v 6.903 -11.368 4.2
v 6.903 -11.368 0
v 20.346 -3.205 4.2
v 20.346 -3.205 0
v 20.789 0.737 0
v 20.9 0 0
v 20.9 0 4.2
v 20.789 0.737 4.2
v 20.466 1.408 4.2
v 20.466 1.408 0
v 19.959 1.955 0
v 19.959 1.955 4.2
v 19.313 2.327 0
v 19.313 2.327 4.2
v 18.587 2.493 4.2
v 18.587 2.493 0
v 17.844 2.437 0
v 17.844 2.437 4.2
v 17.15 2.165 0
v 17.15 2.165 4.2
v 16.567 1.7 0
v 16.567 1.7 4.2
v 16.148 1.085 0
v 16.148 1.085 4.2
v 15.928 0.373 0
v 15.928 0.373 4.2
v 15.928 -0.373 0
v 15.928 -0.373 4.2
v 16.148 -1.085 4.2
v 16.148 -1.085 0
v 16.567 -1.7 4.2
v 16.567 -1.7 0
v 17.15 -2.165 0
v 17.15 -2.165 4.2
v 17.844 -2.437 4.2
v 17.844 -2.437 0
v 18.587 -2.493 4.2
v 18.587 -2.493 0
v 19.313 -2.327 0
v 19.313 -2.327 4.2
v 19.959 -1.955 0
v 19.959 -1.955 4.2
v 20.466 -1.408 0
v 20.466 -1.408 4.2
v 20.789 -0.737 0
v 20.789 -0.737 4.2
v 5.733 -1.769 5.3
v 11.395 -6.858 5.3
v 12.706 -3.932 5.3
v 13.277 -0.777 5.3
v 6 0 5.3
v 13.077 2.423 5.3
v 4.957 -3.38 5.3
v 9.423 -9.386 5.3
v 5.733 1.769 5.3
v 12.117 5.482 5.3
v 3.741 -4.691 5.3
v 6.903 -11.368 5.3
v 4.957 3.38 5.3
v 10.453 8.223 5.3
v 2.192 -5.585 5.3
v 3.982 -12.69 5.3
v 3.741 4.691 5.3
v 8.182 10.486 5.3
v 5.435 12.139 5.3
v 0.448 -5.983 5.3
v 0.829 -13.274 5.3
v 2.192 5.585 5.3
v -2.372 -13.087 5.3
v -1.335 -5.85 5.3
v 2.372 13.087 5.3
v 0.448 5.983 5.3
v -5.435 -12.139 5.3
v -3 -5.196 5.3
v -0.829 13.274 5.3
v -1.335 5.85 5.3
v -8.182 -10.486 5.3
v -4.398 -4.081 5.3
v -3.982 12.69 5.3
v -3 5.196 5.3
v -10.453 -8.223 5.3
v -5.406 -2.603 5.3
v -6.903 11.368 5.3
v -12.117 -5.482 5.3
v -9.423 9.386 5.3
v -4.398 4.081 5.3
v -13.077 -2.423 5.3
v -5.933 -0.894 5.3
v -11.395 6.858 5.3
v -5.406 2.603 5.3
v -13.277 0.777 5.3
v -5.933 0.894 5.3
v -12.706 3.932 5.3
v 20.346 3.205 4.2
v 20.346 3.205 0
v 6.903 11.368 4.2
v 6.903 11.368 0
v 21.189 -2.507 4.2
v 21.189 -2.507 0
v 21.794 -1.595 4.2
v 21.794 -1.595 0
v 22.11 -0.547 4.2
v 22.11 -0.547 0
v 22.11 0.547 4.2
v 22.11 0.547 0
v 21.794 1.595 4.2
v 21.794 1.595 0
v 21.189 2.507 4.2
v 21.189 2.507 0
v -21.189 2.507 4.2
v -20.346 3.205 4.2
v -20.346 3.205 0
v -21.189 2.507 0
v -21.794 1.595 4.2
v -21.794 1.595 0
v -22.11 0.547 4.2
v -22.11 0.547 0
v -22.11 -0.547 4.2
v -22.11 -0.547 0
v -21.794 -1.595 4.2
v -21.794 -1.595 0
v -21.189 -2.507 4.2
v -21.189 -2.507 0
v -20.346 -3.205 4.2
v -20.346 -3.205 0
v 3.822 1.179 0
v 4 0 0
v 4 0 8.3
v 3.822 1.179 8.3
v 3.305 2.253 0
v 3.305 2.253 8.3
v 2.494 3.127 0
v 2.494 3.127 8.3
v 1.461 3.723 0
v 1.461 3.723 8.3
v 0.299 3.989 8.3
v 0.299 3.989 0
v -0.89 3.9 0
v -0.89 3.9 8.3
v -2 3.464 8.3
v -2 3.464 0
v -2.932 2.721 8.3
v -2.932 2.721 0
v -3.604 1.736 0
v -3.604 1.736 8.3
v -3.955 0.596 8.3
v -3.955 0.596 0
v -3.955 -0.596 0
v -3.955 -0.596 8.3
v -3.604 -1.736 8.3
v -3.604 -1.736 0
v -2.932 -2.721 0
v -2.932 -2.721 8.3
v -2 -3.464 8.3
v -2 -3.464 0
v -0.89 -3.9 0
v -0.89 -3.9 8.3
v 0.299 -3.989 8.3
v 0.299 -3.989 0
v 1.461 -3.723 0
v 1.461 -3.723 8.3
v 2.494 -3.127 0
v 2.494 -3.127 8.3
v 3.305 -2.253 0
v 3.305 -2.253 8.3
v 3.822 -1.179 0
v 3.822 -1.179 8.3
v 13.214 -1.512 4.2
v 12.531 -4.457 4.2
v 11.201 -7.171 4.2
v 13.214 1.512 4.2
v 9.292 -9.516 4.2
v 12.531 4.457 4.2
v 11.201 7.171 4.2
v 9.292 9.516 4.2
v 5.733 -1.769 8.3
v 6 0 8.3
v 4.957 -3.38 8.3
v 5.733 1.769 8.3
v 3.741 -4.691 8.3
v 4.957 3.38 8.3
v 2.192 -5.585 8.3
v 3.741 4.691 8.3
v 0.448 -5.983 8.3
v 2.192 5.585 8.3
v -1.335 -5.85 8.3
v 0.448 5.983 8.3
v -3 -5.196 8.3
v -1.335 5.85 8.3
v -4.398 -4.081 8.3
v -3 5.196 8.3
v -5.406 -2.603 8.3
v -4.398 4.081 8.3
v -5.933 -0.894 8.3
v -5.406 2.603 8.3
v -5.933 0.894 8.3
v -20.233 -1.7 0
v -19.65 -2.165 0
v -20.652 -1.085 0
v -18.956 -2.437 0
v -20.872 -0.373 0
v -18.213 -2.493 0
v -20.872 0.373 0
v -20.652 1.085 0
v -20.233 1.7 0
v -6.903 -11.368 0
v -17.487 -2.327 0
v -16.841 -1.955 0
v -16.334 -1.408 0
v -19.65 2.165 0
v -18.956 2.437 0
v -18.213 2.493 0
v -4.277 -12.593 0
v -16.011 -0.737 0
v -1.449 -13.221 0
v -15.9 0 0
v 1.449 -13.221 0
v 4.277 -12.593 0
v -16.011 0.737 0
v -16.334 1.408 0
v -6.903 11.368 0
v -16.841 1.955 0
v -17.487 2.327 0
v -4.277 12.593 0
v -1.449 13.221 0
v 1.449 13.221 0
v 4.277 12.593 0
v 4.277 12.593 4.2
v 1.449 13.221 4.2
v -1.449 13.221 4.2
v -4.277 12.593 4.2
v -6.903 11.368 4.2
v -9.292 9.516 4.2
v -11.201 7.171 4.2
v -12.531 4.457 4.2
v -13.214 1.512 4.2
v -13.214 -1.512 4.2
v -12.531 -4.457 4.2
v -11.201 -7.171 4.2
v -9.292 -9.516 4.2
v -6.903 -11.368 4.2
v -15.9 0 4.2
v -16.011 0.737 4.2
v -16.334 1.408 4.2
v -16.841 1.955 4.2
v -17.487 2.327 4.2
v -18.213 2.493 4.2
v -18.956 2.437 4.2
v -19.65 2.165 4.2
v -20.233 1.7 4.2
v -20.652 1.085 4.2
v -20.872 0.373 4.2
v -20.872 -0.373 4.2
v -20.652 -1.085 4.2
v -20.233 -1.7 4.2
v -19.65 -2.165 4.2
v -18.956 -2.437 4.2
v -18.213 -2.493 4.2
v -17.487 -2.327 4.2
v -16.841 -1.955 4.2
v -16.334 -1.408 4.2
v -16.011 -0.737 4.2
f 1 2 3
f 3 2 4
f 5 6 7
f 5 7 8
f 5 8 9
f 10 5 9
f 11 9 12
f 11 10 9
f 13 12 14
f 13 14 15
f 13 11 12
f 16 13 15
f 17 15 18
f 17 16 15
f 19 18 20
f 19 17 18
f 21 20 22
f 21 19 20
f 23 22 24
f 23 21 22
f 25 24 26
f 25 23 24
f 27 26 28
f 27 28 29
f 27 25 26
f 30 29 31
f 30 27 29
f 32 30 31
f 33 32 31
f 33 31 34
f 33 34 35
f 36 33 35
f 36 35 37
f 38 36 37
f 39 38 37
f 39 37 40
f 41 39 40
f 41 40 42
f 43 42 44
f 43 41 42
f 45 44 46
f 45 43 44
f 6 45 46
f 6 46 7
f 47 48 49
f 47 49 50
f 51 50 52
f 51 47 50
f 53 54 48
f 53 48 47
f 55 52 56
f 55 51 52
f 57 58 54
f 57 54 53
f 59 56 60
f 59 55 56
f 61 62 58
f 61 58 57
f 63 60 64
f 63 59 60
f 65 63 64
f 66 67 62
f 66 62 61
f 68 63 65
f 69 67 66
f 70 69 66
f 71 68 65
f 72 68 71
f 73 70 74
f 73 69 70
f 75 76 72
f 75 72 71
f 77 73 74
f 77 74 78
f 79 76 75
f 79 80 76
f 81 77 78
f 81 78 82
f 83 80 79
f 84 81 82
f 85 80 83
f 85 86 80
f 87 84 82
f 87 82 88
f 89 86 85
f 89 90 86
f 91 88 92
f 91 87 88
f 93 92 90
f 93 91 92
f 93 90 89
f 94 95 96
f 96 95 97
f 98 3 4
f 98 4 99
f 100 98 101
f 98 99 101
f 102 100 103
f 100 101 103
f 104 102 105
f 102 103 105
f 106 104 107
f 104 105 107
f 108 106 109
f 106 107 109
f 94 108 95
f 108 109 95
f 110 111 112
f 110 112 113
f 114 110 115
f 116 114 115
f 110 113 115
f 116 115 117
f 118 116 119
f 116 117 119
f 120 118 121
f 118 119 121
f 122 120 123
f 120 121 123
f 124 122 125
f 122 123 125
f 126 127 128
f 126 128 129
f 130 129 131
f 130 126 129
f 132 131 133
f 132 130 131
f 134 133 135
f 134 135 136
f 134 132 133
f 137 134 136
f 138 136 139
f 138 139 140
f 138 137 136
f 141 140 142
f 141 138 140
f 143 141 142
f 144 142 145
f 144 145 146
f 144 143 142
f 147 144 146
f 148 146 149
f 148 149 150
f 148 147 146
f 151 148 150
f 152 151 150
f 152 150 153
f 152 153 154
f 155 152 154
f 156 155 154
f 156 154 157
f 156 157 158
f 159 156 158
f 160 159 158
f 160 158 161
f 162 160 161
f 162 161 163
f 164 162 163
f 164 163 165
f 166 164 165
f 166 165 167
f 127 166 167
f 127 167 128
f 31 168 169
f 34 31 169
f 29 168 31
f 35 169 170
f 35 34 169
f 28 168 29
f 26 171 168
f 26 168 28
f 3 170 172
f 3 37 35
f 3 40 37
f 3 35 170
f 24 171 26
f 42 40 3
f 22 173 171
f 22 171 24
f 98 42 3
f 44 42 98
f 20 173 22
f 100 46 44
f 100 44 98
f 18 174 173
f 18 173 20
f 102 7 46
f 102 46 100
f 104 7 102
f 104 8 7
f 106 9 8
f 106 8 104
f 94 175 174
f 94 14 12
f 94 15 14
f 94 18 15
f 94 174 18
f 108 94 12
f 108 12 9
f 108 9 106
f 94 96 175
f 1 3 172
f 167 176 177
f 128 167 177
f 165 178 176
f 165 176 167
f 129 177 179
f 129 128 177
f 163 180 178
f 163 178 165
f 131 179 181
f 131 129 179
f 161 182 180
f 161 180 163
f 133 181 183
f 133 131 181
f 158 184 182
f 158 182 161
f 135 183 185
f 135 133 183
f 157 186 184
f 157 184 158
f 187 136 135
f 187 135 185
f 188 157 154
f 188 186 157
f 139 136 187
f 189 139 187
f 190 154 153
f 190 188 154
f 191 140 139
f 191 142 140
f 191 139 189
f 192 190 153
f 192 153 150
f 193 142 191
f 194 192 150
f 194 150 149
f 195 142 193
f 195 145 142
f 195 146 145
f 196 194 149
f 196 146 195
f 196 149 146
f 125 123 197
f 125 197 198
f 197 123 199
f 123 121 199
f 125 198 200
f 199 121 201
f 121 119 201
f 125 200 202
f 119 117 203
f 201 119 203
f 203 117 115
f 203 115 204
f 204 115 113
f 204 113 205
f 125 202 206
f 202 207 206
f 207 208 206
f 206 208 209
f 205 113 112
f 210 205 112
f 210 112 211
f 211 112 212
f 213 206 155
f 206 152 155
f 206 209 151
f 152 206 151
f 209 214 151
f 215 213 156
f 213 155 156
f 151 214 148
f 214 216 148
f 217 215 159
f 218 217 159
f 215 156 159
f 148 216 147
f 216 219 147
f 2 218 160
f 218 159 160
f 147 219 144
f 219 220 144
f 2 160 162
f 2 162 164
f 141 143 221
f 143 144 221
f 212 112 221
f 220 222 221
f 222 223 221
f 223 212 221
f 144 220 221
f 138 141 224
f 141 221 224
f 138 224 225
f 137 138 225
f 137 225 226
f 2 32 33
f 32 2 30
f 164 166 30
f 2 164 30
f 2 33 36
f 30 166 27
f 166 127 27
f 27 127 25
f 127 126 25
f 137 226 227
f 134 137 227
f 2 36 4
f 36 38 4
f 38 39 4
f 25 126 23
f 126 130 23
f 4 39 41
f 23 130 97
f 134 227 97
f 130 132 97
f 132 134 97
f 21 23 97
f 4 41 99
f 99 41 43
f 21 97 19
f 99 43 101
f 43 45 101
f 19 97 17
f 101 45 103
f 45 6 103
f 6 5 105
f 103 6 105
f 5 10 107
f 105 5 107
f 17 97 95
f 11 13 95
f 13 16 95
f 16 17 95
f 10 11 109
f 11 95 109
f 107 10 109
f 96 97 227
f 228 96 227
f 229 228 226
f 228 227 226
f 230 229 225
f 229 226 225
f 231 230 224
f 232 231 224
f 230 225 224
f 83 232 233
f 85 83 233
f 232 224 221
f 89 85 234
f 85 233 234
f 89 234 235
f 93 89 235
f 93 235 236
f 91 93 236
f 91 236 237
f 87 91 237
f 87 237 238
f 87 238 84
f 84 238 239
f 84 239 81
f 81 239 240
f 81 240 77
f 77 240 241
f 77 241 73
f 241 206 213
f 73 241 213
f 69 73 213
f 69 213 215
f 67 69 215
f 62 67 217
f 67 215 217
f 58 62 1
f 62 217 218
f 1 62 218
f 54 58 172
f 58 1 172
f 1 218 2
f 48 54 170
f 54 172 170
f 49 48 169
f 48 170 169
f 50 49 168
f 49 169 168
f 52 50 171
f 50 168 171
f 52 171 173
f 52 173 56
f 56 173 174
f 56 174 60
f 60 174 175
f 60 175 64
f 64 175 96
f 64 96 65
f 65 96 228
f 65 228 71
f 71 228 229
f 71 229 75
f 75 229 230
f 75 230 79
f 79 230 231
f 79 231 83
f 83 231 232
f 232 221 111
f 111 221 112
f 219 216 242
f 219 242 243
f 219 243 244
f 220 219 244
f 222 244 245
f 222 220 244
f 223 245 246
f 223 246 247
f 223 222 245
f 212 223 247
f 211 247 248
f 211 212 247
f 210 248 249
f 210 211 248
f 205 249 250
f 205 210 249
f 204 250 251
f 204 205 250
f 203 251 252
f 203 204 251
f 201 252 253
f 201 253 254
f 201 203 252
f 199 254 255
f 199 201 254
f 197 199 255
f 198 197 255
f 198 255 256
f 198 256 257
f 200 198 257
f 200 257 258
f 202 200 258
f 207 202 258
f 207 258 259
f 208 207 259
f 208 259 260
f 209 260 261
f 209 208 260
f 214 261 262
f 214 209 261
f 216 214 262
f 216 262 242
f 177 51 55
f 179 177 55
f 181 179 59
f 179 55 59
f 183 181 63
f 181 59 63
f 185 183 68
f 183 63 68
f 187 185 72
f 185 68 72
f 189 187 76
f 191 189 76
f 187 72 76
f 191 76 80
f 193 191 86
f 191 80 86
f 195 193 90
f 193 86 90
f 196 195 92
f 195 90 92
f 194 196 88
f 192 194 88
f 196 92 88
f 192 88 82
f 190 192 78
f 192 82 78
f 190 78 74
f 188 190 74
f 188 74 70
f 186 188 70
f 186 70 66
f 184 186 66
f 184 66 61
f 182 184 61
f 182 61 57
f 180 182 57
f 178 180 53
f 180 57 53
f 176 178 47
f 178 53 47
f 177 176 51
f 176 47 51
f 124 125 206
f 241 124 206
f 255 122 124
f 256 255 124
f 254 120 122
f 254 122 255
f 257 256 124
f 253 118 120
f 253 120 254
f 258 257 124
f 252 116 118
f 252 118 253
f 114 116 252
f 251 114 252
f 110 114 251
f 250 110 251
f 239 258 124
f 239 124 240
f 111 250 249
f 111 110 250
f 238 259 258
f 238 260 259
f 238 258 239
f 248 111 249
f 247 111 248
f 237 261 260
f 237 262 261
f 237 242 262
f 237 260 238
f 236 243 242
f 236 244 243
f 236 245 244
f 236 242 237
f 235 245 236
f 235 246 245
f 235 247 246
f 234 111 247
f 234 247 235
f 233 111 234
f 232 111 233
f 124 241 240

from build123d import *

# Parameters (mm, degrees)
SKETCH_1_R          = 2.5
SKETCH_1_R_2        = 4
EXTRUDE_1_DEPTH     = 4.2
SKETCH_1_3_R        = 4
EXTRUDE_2_DEPTH     = 8.3
CUT_EXTRUDE_START   = -3
SKETCH_2_R          = 13.3
SKETCH_2_R_2        = 6
CUT_EXTRUDE_1_DEPTH = 3


with BuildPart() as part:
    # 草图1 → 凸台-拉伸1 (new body)
    with BuildSketch(Plane.XY):
        with BuildLine():
            Line((20.346331522, 3.205353897), (6.90298913, 11.368321823))
            ThreePointArc((6.90298913, 11.368321823), (0, 13.3), (-6.90298913, 11.368321823))
            Line((-6.90298913, 11.368321823), (-20.346331522, 3.205353897))
            ThreePointArc((-20.346331522, 3.205353897), (-22.15, 0), (-20.346331522, -3.205353897))
            Line((-20.346331522, -3.205353897), (-6.90298913, -11.368321823))
            ThreePointArc((-6.90298913, -11.368321823), (0, -13.3), (6.90298913, -11.368321823))
            Line((6.90298913, -11.368321823), (20.346331522, -3.205353897))
            ThreePointArc((20.346331522, -3.205353897), (22.15, 0), (20.346331522, 3.205353897))
        make_face()
        with Locations((18.4, 0)):
            Circle(SKETCH_1_R, mode=Mode.SUBTRACT)
        Circle(SKETCH_1_R_2, mode=Mode.SUBTRACT)
        with Locations((-18.4, 0)):
            Circle(SKETCH_1_R, mode=Mode.SUBTRACT)
    extrude(amount=EXTRUDE_1_DEPTH)

    # 草图1<3> → 凸台-拉伸2 (add)
    with BuildSketch(Plane.XY):
        with BuildLine():
            ThreePointArc((13.3, 0), (11.590939467, 6.522278918), (6.90298913, 11.368321823))
            ThreePointArc((6.90298913, 11.368321823), (0, 13.3), (-6.90298913, 11.368321823))
            ThreePointArc((-6.90298913, 11.368321823), (-13.3, 0), (-6.90298913, -11.368321823))
            ThreePointArc((-6.90298913, -11.368321823), (0, -13.3), (6.90298913, -11.368321823))
            ThreePointArc((6.90298913, -11.368321823), (11.590939467, -6.522278918), (13.3, 0))
        make_face()
        Circle(SKETCH_1_3_R, mode=Mode.SUBTRACT)
    extrude(amount=EXTRUDE_2_DEPTH)

    # 草图2 → 切除-拉伸1 (cut)
    with BuildSketch(Plane.XY.offset(8.3).offset(CUT_EXTRUDE_START)):
        Circle(SKETCH_2_R)
        Circle(SKETCH_2_R_2, mode=Mode.SUBTRACT)
    extrude(amount=CUT_EXTRUDE_1_DEPTH, mode=Mode.SUBTRACT)


solid = part.part
